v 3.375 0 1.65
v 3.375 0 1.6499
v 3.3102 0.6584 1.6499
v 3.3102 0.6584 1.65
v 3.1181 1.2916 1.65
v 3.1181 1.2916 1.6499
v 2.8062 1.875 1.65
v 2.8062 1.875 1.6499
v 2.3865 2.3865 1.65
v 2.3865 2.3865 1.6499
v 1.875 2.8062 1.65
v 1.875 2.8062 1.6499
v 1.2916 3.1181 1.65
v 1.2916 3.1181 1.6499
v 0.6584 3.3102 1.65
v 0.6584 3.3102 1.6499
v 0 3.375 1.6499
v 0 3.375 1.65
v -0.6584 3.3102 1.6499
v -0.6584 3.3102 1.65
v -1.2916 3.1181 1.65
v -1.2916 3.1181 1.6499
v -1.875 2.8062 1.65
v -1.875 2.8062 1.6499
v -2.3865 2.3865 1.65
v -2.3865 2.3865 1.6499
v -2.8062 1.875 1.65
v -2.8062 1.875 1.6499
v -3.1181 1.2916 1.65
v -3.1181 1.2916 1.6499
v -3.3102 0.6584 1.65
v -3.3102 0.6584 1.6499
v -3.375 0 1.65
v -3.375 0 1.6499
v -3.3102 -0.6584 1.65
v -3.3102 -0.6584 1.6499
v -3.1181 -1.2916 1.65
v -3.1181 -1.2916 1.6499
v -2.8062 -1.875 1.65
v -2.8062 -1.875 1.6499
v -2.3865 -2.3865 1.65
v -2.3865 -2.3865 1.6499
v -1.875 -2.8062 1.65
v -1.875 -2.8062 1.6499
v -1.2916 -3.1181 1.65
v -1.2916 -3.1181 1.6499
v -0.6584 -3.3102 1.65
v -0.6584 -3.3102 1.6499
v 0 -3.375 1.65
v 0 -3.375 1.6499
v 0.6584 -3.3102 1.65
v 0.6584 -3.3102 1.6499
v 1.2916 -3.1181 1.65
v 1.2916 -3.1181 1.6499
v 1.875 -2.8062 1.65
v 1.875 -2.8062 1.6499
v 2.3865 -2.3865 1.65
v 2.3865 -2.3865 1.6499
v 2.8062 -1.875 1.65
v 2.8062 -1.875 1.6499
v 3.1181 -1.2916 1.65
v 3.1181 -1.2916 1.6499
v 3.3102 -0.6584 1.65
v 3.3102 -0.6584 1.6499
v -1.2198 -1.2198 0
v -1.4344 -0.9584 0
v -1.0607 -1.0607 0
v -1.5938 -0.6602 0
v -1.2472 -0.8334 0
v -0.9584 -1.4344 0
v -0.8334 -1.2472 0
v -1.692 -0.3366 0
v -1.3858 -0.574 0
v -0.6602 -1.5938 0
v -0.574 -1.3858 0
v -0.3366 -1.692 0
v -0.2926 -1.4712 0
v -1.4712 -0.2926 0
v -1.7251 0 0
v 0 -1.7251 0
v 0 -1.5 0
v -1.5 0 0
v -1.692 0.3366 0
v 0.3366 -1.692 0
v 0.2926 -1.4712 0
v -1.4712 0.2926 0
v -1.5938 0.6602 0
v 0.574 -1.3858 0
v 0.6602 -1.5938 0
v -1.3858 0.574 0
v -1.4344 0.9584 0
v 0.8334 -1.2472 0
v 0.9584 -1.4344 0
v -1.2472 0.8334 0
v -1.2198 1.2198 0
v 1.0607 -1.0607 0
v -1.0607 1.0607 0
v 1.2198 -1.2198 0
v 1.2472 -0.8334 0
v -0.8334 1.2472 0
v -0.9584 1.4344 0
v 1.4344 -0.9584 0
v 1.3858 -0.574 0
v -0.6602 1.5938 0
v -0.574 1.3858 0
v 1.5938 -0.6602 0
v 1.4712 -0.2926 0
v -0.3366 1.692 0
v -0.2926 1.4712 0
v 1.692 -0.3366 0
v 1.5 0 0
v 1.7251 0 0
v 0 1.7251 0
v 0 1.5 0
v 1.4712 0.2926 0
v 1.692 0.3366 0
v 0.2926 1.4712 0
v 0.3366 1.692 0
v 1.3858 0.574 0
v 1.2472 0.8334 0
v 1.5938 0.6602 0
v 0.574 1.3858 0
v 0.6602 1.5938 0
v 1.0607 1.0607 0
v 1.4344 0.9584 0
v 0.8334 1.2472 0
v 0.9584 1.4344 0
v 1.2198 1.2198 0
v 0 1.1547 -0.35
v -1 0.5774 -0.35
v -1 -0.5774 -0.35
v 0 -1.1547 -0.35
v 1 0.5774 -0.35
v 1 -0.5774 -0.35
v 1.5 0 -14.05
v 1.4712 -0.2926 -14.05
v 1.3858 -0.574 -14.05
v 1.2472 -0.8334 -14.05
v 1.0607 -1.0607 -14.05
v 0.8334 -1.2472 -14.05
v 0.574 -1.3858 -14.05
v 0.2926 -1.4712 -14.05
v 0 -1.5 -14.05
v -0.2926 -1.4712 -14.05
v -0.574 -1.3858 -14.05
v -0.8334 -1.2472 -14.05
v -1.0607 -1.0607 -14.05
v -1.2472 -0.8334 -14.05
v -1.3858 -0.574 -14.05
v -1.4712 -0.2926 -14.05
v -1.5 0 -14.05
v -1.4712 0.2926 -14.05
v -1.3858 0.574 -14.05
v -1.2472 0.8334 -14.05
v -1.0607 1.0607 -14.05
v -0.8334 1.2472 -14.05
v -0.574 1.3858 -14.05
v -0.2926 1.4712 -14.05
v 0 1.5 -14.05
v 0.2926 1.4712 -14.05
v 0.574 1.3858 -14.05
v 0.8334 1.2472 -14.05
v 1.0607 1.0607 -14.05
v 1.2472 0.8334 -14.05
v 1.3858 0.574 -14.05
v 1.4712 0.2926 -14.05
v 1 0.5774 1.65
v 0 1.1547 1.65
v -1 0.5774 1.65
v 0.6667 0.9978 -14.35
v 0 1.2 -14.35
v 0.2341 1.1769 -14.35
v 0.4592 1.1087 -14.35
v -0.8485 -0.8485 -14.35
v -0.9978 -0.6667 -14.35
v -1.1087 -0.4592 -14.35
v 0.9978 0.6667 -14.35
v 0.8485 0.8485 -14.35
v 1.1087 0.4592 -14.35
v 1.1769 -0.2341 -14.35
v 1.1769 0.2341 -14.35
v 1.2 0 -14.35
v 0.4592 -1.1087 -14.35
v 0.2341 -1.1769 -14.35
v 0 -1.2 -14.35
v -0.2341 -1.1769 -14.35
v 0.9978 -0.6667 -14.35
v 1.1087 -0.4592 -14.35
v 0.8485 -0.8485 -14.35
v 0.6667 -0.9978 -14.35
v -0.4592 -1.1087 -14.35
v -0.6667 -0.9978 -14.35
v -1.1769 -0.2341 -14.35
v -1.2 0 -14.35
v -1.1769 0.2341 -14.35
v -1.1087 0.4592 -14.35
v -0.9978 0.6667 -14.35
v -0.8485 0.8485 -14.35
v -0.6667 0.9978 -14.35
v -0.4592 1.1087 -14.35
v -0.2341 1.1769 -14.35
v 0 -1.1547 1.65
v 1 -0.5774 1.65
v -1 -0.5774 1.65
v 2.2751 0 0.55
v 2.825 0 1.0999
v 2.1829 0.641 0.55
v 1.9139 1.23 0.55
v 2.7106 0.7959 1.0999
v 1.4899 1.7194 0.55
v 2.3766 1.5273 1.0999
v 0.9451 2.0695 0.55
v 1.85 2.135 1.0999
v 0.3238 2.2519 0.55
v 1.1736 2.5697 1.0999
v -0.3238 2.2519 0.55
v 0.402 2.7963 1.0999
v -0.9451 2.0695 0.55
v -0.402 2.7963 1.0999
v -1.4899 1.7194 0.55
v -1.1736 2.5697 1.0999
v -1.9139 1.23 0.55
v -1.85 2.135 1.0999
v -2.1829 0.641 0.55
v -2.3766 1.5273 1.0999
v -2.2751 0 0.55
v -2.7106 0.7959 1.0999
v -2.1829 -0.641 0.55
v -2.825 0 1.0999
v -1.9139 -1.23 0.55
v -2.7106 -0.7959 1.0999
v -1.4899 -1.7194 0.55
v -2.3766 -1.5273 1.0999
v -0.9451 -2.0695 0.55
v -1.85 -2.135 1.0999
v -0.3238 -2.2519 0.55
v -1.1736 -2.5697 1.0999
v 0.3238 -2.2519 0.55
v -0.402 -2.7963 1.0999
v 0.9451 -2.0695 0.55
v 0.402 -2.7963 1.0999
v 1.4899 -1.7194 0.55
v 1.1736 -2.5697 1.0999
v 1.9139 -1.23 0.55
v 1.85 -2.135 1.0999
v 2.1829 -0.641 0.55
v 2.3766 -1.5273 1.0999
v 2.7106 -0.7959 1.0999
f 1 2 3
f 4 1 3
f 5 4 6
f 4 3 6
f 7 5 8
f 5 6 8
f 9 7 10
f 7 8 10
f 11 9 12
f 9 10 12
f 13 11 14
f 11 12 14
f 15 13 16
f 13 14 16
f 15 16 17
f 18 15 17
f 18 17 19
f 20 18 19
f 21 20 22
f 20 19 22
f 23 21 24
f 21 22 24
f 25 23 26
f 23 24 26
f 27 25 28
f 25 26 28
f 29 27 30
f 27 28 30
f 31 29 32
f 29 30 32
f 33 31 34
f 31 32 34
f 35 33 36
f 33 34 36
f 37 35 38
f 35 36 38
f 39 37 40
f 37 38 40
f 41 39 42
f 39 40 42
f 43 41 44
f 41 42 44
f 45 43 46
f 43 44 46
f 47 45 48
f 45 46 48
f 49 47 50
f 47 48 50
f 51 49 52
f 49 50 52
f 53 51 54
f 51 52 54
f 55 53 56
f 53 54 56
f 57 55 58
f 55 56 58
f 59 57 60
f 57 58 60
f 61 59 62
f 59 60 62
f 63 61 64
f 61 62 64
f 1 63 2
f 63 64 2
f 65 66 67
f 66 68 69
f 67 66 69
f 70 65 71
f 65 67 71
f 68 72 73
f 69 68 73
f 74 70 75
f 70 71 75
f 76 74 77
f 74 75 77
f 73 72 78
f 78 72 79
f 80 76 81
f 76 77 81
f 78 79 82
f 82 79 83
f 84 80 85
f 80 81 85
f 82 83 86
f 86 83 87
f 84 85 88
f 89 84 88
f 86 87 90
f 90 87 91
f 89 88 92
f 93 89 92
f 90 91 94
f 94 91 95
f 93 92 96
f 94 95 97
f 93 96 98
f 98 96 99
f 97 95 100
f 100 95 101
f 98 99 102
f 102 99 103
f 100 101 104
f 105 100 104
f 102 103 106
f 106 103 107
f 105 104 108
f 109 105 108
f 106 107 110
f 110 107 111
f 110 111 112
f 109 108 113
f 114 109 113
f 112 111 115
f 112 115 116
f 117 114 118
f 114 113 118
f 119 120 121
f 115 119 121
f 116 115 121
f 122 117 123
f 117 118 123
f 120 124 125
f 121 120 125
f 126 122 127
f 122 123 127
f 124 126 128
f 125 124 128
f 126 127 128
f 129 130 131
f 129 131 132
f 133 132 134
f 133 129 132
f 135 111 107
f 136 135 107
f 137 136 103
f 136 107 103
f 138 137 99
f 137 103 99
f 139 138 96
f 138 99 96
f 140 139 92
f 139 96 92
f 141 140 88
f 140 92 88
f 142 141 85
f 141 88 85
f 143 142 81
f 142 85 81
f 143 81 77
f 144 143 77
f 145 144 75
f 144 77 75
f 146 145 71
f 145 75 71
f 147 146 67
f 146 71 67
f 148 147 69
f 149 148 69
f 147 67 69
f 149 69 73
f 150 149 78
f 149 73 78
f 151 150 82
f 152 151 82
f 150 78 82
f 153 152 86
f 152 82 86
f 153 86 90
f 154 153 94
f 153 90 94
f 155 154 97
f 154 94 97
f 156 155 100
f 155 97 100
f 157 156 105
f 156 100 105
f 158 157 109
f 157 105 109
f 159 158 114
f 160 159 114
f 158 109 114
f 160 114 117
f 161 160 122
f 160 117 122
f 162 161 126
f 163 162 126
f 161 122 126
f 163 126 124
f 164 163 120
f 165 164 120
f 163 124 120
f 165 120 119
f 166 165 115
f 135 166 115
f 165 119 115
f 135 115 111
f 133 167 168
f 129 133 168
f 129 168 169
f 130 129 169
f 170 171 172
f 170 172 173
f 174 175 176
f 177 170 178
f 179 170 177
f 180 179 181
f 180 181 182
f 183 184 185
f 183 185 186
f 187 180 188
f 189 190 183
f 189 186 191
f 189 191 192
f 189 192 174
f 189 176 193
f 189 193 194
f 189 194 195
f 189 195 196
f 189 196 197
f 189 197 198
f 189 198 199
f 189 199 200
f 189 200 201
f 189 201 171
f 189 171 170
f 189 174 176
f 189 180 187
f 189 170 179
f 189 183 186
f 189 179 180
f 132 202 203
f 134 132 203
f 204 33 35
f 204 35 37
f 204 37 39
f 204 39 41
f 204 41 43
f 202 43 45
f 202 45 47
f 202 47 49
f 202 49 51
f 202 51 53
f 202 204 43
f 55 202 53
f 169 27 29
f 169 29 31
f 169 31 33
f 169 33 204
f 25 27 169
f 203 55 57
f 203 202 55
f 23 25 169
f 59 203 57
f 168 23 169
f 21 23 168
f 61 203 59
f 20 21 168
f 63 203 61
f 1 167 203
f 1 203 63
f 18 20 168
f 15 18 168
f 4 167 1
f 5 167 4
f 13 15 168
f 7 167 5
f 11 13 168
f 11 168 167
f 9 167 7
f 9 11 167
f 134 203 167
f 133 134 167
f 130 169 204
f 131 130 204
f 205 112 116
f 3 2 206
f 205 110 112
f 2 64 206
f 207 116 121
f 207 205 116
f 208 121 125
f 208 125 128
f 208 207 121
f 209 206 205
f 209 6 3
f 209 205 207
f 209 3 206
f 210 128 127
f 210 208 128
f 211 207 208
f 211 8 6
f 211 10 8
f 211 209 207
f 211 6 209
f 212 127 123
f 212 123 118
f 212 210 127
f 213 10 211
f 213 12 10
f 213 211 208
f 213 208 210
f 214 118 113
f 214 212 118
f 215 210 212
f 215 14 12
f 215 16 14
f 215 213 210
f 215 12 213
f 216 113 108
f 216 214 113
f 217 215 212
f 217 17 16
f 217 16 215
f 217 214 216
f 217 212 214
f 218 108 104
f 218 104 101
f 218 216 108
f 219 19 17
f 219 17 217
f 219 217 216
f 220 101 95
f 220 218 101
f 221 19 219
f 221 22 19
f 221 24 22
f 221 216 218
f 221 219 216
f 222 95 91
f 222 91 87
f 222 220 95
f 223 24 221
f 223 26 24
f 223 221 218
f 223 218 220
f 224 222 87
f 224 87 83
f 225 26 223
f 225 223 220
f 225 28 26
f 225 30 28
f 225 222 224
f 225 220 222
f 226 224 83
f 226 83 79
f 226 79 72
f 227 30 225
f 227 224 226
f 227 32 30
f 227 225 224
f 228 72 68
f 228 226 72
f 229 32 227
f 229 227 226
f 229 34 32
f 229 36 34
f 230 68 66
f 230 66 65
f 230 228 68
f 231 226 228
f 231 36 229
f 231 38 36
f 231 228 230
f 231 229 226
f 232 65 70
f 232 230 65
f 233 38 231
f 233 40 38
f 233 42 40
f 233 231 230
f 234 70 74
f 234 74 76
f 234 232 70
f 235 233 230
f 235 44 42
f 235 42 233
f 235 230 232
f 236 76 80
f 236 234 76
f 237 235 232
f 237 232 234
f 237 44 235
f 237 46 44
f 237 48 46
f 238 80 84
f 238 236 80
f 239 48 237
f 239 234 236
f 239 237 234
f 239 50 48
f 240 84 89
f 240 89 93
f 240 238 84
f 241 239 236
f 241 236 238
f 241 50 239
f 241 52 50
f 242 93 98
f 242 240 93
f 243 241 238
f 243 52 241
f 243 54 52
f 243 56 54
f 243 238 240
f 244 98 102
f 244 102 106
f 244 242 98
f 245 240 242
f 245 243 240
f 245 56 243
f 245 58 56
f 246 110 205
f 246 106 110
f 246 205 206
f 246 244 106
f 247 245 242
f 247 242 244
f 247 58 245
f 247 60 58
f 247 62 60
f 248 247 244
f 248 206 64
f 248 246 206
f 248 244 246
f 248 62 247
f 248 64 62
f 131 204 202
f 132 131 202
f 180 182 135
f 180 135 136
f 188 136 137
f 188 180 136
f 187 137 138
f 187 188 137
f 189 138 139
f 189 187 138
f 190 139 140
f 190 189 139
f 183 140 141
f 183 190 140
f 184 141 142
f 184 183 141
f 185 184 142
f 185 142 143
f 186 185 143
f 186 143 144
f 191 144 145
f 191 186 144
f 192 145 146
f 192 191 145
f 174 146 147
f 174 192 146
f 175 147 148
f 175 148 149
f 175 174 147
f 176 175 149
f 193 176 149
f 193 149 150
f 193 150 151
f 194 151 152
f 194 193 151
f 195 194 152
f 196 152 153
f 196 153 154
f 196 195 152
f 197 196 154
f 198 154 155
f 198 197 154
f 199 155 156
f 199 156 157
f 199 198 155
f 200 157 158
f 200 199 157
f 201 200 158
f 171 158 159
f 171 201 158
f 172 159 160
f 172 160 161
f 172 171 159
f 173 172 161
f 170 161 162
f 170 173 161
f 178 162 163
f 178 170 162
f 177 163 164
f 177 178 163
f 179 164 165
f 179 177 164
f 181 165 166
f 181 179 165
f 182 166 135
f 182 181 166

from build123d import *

# Parameters (mm, degrees)
SKETCH1_R           = 3.375
BOSS_EXTRUDE1_DEPTH = 1.65
SKETCH2_R           = 1.5
BOSS_EXTRUDE2_DEPTH = 14.35
CHAMFER1_SIZE       = 0.3
CUT_EXTRUDE1_DEPTH  = 2
CHAMFER2_SIZE       = 1.65


with BuildPart() as part:
    # Sketch1 → Boss-Extrude1 (new body)
    with BuildSketch(Plane.XY):
        Circle(SKETCH1_R)
    extrude(amount=BOSS_EXTRUDE1_DEPTH)

    # Sketch2 → Boss-Extrude2 (add)
    with BuildSketch(Plane(origin=(0, 0, 0), x_dir=(-1, 0, 0), z_dir=(0, 0, -1))):
        with Locations(Location((0, 0, 0), (0, 0, 180))):
            Circle(SKETCH2_R)
    extrude(amount=BOSS_EXTRUDE2_DEPTH)

    # Chamfer1
    chamfer1_edges = [part.edges().sort_by_distance(p)[0] for p in [
        (-1.5, 0, -14.35),
    ]]
    chamfer(chamfer1_edges, length=CHAMFER1_SIZE)

    # Sketch3 → Cut-Extrude1 (cut)
    with BuildSketch(Plane.XY.offset(1.65)):
        Polygon((0, 1.154700538), (-1, 0.577350269), (-1, -0.577350269), (0, -1.154700538), (1, -0.577350269), (1, 0.577350269), align=None)
    extrude(amount=-CUT_EXTRUDE1_DEPTH, mode=Mode.SUBTRACT)

    # Chamfer2
    chamfer2_edges = [part.edges().sort_by_distance(p)[0] for p in [
        (-3.375, 0, 0),
    ]]
    chamfer(chamfer2_edges, length=CHAMFER2_SIZE - 0.0001)  # a hair under: the kernel refuses the full size


solid = part.part
